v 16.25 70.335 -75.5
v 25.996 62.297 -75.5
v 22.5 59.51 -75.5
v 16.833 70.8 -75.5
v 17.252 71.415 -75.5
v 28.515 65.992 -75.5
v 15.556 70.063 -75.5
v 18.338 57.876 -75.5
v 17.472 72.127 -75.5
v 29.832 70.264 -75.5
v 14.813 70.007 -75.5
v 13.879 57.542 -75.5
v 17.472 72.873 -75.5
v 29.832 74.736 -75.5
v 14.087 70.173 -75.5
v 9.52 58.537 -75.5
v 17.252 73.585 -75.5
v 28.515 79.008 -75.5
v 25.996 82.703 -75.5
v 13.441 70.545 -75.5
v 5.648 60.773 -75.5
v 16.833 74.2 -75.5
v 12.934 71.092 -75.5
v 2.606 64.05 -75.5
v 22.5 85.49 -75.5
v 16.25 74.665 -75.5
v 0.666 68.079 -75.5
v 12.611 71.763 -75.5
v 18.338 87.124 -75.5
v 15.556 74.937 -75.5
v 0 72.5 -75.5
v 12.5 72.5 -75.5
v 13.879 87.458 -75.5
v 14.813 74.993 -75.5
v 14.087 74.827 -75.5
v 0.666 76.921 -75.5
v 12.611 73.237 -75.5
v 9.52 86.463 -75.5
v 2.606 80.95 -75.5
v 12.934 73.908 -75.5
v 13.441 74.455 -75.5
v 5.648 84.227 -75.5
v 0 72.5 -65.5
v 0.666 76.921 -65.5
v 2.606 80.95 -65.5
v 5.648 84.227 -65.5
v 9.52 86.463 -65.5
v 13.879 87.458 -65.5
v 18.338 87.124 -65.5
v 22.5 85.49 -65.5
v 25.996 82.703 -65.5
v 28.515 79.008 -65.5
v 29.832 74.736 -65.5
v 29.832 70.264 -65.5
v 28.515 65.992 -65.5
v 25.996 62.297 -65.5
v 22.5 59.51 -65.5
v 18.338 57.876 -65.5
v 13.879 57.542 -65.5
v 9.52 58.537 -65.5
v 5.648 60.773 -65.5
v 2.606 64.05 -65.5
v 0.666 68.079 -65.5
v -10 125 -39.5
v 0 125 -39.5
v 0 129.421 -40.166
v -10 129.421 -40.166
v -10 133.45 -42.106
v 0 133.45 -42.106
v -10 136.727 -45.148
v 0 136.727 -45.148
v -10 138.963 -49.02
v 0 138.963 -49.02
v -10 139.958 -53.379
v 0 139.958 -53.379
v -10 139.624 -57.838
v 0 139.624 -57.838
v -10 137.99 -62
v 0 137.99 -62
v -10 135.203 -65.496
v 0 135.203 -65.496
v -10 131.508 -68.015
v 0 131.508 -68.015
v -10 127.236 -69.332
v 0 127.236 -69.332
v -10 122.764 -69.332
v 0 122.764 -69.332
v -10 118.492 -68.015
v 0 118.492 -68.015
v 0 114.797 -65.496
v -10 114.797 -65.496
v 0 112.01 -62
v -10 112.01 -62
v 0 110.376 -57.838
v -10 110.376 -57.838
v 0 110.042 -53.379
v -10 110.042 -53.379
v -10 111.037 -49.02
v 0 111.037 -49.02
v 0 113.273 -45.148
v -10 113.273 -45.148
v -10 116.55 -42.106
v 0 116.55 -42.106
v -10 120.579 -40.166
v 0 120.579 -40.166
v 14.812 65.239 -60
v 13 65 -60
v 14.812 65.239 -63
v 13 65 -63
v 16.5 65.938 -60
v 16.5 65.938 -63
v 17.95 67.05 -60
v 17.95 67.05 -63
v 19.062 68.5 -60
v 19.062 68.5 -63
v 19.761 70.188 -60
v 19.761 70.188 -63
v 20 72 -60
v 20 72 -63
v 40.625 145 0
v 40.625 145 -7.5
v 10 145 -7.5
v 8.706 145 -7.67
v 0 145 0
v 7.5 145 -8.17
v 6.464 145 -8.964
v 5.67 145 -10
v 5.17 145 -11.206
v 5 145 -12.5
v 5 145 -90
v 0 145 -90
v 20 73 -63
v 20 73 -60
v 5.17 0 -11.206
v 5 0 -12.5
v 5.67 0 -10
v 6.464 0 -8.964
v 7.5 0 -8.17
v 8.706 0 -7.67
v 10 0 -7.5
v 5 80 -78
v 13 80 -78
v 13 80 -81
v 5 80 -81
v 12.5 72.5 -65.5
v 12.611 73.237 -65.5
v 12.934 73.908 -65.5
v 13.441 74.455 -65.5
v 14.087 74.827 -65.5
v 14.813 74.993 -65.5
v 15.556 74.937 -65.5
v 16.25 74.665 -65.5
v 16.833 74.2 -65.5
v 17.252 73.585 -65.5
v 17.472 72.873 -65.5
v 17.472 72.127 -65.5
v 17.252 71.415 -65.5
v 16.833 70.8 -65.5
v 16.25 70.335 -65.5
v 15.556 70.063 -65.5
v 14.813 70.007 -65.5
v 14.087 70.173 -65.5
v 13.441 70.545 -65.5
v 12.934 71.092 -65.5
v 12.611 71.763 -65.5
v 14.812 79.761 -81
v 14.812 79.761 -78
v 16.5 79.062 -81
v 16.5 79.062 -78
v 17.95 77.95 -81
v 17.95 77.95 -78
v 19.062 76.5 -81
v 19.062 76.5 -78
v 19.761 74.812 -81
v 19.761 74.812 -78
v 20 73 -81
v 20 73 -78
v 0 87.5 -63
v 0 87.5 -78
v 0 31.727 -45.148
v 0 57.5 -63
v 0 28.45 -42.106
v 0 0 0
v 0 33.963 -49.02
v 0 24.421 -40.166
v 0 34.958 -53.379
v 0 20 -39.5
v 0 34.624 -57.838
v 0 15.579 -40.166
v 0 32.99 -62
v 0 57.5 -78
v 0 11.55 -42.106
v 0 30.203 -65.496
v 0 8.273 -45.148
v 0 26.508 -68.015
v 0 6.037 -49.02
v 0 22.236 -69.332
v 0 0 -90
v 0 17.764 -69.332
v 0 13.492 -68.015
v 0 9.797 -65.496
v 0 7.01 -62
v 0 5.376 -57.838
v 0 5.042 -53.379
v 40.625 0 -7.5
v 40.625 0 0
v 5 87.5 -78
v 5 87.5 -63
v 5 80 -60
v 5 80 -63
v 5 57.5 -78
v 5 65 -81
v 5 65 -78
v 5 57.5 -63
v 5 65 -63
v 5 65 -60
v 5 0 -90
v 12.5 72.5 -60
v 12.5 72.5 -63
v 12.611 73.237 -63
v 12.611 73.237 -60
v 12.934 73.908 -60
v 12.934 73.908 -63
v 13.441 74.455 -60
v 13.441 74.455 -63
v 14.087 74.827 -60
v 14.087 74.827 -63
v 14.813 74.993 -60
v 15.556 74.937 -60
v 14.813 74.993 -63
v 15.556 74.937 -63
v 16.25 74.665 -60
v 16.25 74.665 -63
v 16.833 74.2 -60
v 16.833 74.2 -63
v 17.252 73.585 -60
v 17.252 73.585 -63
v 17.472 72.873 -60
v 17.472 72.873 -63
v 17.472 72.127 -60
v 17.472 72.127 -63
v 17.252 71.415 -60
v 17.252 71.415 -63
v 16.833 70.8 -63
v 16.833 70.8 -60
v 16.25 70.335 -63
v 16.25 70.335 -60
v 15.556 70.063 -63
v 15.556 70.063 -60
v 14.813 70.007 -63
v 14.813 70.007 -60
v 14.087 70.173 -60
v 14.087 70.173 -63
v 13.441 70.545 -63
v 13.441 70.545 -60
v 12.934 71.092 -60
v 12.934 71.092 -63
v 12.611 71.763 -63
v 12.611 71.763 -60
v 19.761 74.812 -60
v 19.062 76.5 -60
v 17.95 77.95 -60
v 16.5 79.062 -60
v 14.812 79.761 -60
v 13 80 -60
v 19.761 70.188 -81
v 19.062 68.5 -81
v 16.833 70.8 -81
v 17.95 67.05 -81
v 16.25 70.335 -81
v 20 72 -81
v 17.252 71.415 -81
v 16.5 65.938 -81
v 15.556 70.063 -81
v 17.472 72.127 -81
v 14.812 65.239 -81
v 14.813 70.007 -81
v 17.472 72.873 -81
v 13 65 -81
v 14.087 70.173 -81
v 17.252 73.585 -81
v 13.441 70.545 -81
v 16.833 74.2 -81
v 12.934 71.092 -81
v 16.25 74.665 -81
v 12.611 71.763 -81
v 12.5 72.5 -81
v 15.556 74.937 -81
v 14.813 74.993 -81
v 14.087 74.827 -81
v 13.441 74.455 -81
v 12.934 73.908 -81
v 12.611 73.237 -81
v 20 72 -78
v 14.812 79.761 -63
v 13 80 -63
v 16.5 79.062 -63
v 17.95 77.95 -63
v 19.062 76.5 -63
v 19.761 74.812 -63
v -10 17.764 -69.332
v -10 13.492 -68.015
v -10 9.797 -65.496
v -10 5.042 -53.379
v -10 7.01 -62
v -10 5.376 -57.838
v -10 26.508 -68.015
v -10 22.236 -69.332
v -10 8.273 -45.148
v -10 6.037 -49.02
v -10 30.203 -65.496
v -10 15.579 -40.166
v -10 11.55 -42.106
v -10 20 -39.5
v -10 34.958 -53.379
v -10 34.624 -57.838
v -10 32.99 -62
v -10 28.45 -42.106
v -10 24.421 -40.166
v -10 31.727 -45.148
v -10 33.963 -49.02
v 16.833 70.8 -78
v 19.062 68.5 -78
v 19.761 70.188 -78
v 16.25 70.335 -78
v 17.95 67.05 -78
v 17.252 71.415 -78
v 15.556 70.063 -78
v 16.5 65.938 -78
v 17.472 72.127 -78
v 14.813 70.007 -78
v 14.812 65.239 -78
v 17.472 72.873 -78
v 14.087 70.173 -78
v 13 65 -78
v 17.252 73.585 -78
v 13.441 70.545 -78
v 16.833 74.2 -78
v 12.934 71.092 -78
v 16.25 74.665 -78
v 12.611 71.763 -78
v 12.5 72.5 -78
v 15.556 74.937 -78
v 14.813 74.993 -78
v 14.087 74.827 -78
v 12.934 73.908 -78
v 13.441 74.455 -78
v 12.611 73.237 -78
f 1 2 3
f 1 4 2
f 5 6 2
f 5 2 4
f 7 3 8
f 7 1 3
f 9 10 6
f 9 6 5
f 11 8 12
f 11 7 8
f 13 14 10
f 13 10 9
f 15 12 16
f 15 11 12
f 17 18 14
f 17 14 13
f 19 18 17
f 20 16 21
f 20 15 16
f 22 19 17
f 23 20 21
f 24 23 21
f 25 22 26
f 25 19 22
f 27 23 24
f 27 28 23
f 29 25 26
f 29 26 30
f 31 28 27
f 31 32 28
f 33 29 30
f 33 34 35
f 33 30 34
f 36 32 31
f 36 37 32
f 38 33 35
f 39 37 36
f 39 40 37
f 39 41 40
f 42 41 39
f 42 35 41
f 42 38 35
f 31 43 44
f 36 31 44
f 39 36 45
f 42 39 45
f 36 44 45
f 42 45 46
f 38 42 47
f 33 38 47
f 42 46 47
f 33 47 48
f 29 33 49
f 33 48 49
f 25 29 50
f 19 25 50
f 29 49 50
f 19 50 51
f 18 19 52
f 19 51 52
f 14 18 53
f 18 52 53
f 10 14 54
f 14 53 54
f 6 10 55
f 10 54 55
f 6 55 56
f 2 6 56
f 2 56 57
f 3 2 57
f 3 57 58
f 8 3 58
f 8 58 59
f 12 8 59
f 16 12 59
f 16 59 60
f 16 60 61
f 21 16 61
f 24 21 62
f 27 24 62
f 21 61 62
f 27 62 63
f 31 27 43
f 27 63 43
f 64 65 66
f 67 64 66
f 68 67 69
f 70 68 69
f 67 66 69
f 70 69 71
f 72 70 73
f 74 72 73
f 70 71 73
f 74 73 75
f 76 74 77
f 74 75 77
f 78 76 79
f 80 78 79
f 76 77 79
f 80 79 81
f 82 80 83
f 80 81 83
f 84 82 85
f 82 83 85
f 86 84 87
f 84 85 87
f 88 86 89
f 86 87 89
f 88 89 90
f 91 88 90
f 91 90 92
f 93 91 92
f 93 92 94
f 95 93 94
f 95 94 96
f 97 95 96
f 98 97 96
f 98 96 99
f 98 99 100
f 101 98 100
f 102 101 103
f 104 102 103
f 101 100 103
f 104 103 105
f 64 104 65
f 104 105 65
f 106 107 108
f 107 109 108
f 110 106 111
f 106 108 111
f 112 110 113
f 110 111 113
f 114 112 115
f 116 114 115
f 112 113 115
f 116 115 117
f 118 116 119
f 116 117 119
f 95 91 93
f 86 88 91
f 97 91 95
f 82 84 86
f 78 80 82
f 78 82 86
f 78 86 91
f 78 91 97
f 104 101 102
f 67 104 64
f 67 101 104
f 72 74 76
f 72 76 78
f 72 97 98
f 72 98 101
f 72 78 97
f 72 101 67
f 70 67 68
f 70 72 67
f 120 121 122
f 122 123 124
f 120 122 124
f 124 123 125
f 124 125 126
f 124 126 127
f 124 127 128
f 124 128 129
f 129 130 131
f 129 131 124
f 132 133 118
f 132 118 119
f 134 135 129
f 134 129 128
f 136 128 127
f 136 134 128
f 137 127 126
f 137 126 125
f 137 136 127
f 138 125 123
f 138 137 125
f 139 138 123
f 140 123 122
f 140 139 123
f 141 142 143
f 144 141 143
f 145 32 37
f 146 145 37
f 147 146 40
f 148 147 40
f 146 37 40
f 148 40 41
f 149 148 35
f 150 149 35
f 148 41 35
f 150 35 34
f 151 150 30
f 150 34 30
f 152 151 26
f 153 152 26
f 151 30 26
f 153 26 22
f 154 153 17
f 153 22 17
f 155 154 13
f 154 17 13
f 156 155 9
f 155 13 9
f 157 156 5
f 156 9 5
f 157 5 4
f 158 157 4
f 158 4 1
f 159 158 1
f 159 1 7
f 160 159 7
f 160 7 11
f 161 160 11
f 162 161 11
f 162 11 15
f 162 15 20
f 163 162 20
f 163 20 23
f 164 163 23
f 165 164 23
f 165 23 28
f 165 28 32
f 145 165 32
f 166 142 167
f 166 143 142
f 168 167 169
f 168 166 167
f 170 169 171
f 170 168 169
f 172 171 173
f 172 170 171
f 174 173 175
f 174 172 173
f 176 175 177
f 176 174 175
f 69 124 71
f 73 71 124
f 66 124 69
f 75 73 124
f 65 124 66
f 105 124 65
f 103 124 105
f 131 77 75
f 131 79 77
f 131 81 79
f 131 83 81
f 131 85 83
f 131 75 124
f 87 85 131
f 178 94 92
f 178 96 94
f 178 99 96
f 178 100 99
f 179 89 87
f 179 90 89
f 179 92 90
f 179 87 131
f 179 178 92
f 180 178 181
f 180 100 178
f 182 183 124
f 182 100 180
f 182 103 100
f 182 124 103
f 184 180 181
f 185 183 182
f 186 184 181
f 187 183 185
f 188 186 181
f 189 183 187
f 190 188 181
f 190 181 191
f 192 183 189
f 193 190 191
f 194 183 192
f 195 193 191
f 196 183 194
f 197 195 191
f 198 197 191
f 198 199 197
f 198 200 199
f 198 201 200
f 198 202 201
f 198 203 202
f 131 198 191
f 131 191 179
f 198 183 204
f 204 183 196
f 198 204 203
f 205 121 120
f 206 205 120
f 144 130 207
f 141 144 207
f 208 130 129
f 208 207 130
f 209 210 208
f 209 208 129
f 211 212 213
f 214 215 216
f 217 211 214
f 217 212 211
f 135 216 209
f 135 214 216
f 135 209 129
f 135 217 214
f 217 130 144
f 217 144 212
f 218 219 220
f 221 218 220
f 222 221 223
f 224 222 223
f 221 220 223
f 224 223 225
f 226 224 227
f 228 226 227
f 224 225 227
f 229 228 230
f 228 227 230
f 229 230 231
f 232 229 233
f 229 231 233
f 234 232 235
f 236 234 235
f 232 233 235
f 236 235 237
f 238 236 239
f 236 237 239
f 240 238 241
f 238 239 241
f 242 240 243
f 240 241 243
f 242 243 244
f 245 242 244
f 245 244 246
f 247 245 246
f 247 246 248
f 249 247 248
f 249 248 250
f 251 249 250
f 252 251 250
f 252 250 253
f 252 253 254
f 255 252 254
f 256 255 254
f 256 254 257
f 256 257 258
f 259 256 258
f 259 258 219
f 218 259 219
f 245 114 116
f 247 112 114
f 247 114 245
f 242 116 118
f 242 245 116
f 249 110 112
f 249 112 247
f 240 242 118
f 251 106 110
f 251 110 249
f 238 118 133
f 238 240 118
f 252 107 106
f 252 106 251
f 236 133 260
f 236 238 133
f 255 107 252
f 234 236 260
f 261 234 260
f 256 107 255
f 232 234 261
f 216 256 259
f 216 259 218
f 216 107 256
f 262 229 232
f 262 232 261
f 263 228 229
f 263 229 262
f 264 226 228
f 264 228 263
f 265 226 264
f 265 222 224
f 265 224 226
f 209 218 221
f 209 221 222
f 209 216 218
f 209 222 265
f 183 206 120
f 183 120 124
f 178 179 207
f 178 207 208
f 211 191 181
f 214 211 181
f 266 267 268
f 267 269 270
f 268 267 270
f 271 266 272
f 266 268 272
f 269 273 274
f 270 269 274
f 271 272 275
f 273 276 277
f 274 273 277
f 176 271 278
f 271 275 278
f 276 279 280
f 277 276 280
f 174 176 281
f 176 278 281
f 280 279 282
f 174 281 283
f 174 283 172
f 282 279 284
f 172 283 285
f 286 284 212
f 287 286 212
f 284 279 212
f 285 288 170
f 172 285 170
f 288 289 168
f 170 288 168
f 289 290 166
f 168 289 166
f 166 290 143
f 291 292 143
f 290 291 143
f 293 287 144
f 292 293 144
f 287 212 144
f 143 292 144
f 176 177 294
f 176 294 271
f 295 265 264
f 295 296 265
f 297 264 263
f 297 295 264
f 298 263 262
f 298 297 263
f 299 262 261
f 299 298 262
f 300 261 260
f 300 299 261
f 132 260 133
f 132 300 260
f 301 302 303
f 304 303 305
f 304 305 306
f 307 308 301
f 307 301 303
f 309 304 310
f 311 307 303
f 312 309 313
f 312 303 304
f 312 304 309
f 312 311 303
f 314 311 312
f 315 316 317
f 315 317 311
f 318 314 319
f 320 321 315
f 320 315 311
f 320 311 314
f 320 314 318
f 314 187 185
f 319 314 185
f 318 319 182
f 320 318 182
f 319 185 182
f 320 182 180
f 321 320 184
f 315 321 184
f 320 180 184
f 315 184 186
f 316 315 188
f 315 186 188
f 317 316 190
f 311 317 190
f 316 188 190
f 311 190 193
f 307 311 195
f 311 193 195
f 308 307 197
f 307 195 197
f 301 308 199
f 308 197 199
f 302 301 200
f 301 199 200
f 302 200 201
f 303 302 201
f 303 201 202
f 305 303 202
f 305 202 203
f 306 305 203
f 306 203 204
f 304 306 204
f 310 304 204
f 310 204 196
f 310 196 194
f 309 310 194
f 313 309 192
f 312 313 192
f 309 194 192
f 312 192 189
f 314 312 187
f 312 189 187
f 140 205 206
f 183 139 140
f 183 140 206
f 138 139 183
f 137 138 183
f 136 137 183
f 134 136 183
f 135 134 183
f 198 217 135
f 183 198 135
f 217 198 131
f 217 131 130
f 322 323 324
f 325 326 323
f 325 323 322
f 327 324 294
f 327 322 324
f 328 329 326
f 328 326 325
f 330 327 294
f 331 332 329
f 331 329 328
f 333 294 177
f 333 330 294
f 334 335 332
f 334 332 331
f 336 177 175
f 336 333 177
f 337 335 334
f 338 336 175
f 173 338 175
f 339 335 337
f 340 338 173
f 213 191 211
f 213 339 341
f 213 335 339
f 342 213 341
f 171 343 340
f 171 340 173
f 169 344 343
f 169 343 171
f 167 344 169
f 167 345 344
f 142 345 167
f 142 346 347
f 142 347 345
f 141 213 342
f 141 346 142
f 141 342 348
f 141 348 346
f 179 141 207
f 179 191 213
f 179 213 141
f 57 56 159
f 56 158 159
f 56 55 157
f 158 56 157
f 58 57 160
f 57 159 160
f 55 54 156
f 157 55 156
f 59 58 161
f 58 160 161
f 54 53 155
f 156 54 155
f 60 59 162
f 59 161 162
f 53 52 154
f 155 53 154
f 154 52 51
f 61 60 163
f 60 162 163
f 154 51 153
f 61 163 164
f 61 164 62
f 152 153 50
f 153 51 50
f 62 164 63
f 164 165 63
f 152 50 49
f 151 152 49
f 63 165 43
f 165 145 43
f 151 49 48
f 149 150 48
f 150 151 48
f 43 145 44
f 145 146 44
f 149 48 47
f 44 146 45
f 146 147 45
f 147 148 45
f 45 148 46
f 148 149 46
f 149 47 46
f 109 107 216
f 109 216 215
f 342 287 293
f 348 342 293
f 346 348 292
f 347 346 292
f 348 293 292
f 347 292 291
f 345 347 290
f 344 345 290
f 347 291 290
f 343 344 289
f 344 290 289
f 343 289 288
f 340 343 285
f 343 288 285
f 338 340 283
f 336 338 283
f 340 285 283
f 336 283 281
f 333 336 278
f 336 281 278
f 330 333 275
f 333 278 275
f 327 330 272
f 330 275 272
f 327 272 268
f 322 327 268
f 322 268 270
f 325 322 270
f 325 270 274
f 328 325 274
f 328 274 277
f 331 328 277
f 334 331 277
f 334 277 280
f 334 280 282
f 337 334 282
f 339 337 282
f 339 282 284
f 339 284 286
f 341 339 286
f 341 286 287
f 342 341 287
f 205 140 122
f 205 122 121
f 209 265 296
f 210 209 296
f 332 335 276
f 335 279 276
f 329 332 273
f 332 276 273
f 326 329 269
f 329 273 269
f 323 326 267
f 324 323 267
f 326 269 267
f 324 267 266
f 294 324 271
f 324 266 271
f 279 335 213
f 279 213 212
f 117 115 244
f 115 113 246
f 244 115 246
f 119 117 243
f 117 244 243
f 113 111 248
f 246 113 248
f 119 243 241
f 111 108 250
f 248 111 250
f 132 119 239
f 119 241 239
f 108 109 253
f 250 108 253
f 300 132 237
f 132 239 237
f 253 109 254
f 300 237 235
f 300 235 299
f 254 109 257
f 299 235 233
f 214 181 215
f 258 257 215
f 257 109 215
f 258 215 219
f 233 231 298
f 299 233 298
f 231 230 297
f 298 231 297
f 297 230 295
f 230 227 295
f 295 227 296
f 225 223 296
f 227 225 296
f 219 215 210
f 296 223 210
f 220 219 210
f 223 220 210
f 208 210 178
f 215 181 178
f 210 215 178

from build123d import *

# Parameters (mm, degrees)
BOSS_EXTRUDE1_DEPTH = 145
SKETCH3_R           = 15
BOSS_EXTRUDE2_DEPTH = 10
SKETCH4_W           = 15
SKETCH4_H           = 30
CUT_EXTRUDE1_DEPTH  = 10
SKETCH6_R           = 15
BOSS_EXTRUDE3_DEPTH = 10
SKETCH7_W           = 3
SKETCH7_H           = 15
BOSS_EXTRUDE4_DEPTH = 15
FILLET1_R           = 7
SKETCH8_R           = 2.5
CUT_EXTRUDE2_DEPTH  = 25


with BuildPart() as part:
    # Sketch1 → Boss-Extrude1 (new body)
    with BuildSketch(Plane(origin=(0, 0, 0), x_dir=(1, 0, 0), z_dir=(0, 1, 0))):
        with BuildLine():
            Line((0, 0), (0, 90))
            Line((0, 90), (5, 90))
            Line((5, 90), (5, 12.5))
            ThreePointArc((5, 12.5), (6.464466094, 8.964466094), (10, 7.5))
            Line((10, 7.5), (40.625, 7.5))
            Line((40.625, 7.5), (40.625, 0))
            Line((40.625, 0), (0, 0))
        make_face()
    extrude(amount=BOSS_EXTRUDE1_DEPTH)

    # Sketch3 → Boss-Extrude2 (add)
    with BuildSketch(Plane.ZY):
        with Locations((-54.5, 125)):
            Circle(SKETCH3_R)
        with Locations((-54.5, 20)):
            Circle(SKETCH3_R)
    extrude(amount=BOSS_EXTRUDE2_DEPTH)

    # Sketch4 → Cut-Extrude1 (cut)
    with BuildSketch(Plane.ZY):
        with Locations((-70.5, 72.5)):
            Rectangle(SKETCH4_W, SKETCH4_H)
    extrude(amount=-CUT_EXTRUDE1_DEPTH, mode=Mode.SUBTRACT)

    # Sketch7 → Boss-Extrude4 (add)
    with BuildSketch(Plane(origin=(5, 0, 0), x_dir=(0, 0, -1), z_dir=(1, 0, 0))):
        with Locations((79.5, 72.5)):
            Rectangle(SKETCH7_W, SKETCH7_H)
        with Locations((61.5, 72.5)):
            Rectangle(SKETCH7_W, SKETCH7_H)
    extrude(amount=BOSS_EXTRUDE4_DEPTH)

    # Fillet1
    fillet1_edges = [part.edges().sort_by_distance(p)[0] for p in [
        (20, 80, -61.5),
        (20, 65, -61.5),
        (20, 80, -79.5),
        (20, 65, -79.5),
    ]]
    fillet(fillet1_edges, radius=FILLET1_R)


with BuildPart() as body_2:
    # Sketch6 → Boss-Extrude3 (new body)
    with BuildSketch(Plane(origin=(0, 0, -65.5), x_dir=(-1, 0, 0), z_dir=(0, 0, -1))):
        with Locations((-15, 72.5)):
            Circle(SKETCH6_R)
    extrude(amount=BOSS_EXTRUDE3_DEPTH)


with BuildPart() as cut_extrude2_tool:
    # Sketch8 → Cut-Extrude2 (new body)
    with BuildSketch(Plane(origin=(0, 0, -81), x_dir=(-1, 0, 0), z_dir=(0, 0, -1))):
        with Locations((-15, 72.5)):
            Circle(SKETCH8_R)
    extrude(amount=-CUT_EXTRUDE2_DEPTH)


with BuildPart() as part_1:
    add(part.part)

    # Cut-Extrude2: cut by cut_extrude2_tool
    add(cut_extrude2_tool.part, mode=Mode.SUBTRACT)


with BuildPart() as body_2_1:
    add(body_2.part)

    # Cut-Extrude2: cut by cut_extrude2_tool
    add(cut_extrude2_tool.part, mode=Mode.SUBTRACT)


solid = Compound([part_1.part, body_2_1.part])
